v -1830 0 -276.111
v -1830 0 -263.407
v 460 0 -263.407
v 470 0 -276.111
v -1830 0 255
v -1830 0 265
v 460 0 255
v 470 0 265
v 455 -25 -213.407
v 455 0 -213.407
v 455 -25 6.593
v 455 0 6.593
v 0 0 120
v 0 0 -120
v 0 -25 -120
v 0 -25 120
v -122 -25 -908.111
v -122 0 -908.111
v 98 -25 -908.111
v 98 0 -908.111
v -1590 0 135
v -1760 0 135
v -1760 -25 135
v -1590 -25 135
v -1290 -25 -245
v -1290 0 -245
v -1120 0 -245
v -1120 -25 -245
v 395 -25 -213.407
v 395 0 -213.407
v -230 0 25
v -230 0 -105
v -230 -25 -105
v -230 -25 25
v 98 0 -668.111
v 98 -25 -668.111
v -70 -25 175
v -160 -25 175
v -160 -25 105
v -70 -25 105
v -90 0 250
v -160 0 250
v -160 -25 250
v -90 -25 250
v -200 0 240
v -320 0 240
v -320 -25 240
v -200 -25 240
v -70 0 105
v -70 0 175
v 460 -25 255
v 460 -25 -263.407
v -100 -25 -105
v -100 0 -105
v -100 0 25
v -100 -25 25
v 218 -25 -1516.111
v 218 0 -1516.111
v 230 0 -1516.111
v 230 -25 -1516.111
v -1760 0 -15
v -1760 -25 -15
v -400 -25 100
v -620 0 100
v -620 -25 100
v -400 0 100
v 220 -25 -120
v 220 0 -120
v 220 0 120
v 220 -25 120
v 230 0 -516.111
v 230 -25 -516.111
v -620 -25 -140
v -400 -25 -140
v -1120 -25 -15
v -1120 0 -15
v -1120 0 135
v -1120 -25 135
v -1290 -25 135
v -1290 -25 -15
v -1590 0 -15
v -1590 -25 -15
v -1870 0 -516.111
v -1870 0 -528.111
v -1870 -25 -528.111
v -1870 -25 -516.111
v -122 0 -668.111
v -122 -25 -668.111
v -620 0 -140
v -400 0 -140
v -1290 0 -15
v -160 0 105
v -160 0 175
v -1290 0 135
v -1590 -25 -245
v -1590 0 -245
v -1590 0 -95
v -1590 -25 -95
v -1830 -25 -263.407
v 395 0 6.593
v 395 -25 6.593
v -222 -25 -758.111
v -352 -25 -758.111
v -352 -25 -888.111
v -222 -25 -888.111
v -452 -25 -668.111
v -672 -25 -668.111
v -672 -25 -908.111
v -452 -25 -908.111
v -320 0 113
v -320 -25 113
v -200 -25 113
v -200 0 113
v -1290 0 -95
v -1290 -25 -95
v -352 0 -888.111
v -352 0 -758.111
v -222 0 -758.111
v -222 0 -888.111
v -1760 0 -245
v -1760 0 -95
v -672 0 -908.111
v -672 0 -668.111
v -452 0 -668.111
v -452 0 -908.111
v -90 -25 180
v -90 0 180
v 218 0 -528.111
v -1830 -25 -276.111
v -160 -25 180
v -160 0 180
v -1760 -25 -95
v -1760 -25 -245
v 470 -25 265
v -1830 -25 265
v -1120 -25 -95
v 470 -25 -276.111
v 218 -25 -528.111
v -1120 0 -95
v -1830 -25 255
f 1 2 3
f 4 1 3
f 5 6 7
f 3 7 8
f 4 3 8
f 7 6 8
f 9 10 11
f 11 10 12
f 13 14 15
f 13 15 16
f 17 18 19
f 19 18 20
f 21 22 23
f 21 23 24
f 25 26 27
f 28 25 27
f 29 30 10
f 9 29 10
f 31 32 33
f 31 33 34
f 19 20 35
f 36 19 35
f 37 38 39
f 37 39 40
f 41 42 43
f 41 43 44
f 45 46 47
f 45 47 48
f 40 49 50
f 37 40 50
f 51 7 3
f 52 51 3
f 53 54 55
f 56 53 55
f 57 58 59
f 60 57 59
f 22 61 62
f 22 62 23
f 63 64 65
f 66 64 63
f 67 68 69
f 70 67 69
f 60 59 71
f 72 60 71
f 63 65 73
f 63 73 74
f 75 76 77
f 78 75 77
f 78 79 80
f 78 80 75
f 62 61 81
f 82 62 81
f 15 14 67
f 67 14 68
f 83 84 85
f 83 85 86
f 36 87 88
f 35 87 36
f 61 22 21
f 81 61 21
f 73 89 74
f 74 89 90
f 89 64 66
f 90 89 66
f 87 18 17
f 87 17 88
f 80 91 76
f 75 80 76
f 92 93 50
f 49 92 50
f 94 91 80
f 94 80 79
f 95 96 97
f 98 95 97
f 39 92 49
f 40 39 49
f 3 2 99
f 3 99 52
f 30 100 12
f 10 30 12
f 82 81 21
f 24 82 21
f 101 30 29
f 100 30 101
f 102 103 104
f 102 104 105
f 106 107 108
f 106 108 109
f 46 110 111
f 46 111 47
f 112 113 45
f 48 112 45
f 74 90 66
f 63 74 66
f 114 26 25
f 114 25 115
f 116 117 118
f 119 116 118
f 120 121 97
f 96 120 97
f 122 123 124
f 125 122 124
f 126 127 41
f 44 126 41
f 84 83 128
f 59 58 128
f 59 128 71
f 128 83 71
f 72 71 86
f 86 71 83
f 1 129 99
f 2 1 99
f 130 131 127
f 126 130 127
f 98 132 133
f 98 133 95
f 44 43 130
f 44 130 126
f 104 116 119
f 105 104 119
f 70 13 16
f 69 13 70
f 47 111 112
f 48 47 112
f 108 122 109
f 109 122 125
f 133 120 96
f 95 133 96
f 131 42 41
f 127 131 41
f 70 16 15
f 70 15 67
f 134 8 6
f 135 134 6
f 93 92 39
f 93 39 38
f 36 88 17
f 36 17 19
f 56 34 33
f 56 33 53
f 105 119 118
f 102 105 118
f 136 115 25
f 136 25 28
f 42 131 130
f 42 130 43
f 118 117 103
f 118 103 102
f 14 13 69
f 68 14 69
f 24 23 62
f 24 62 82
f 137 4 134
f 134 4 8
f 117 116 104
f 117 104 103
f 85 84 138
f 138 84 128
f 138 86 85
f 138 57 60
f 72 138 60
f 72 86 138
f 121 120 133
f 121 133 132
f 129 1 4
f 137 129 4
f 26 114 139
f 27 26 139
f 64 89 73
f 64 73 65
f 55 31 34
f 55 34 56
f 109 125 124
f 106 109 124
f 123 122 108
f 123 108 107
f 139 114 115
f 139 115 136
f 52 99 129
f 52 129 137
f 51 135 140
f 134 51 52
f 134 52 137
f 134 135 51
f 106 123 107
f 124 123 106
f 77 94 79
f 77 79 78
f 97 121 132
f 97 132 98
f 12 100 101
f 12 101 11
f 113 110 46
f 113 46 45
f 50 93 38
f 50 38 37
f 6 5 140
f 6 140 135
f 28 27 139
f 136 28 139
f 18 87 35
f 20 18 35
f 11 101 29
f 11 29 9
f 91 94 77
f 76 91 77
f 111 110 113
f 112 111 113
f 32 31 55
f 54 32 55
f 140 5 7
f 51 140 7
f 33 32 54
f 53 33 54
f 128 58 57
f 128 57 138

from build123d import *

# Parameters (mm, degrees)
F0_W     = 220
F0_H     = 240
F0_W_2   = 10
F0_H_2   = 518.406718
F0_H_3   = 10
F0_W_3   = 2290
F0_H_4   = 12.703896
F0_W_4   = 130
F0_H_5   = 130
F0_W_5   = 120
F0_H_6   = 127
F0_W_6   = 90
F0_H_7   = 70
F0_W_7   = 70
F0_W_8   = 60
F0_H_8   = 220
F0_W_9   = 170
F0_H_9   = 150
F0_W_10  = 12
F0_H_10  = 12
F0_W_11  = 2088
F0_H_11  = 988
F1_DEPTH = 25


with BuildPart() as f1:
    # F0 (on Front) → F1 (new body)
    with BuildSketch(Plane.XZ):
        with Locations((110, 0)):
            Rectangle(F0_W, F0_H)
        with Locations((465, -4.203359)):
            Rectangle(F0_W_2, F0_H_2)
        with Locations((465, 260)):
            Rectangle(F0_W_2, F0_H_3)
        with Locations((-685, 260)):
            Rectangle(F0_W_3, F0_H_3)
        with Locations((465, -269.758666)):
            Rectangle(F0_W_2, F0_H_4)
        with Locations((-685, -269.758666)):
            Rectangle(F0_W_3, F0_H_4)
        with Locations((-165, -40)):
            Rectangle(F0_W_4, F0_H_5)
        with Locations((-260, 176.5)):
            Rectangle(F0_W_5, F0_H_6)
        with Locations((-115, 140)):
            Rectangle(F0_W_6, F0_H_7)
        with Locations((-125, 215)):
            Rectangle(F0_W_7, F0_H_7)
        with Locations((425, -103.406718)):
            Rectangle(F0_W_8, F0_H_8)
        with Locations((-510, -20)):
            Rectangle(F0_W, F0_H)
        with Locations((-1205, 60)):
            Rectangle(F0_W_9, F0_H_9)
        with Locations((-1205, -170)):
            Rectangle(F0_W_9, F0_H_9)
        with Locations((224, -522.110614)):
            Rectangle(F0_W_10, F0_H_10)
        with Locations((-826, -522.110614)):
            Rectangle(F0_W_11, F0_H_10)
        with Locations((224, -1022.110614)):
            Rectangle(F0_W_10, F0_H_11)
        with Locations((-562, -788.110614)):
            Rectangle(F0_W, F0_H)
        with Locations((-12, -788.110614)):
            Rectangle(F0_W, F0_H)
        with Locations((-287, -823.110614)):
            Rectangle(F0_W_4, F0_H_5)
        with Locations((-1675, 60)):
            Rectangle(F0_W_9, F0_H_9)
        with Locations((-1675, -170)):
            Rectangle(F0_W_9, F0_H_9)
    extrude(amount=F1_DEPTH)


solid = f1.part
